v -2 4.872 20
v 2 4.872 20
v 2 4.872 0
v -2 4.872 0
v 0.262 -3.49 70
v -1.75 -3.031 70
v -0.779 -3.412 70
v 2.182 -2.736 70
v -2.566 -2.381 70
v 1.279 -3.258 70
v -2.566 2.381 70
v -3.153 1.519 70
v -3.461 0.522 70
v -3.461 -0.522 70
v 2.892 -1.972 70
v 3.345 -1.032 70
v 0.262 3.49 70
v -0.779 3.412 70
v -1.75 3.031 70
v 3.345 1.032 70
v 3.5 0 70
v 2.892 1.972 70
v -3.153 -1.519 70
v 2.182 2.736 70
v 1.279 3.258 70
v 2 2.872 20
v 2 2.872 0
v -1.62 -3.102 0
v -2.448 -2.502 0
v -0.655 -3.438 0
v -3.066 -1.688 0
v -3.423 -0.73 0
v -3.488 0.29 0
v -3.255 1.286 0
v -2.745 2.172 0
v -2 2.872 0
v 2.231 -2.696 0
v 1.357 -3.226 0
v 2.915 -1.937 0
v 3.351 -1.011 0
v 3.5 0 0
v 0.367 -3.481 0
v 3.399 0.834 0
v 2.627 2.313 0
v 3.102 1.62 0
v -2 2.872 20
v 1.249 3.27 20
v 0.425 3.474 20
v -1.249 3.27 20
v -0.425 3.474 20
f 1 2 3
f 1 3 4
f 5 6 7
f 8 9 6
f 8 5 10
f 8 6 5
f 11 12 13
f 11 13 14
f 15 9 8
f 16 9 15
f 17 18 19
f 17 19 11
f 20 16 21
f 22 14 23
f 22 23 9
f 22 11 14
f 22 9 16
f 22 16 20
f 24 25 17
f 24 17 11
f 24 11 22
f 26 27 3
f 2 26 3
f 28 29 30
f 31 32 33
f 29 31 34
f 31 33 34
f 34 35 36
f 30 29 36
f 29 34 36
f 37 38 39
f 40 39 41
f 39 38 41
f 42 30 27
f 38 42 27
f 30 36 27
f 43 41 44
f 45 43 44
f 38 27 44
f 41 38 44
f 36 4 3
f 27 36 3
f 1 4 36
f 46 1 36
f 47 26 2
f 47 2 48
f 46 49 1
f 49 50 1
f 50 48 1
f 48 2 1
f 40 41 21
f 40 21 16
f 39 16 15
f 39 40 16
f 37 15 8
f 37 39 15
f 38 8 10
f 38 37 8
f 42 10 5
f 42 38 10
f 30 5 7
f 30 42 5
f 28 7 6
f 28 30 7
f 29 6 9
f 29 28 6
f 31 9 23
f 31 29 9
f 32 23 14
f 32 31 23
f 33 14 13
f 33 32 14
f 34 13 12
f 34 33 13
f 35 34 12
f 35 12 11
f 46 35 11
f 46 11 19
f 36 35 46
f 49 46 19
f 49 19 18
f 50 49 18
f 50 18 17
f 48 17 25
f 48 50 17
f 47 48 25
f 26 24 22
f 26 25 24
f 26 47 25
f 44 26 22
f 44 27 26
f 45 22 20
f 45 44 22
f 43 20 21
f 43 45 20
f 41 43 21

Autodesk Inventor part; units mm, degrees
ref_plane "YZ Plane" through (0, 0, 0) normal (1, 0, 0) x (0, 1, 0)
ref_plane "XZ Plane" through (0, 0, 0) normal (0, 1, 0) x (-1, 0, 0)
ref_plane "XY Plane" through (0, 0, 0) normal (0, 0, 1) x (1, 0, 0)
sketch "Sketch1" plane through (0, 0, 0) normal (0, 0, 1) x (1, 0, 0)
  circle A0 centre (0, 0) radius 3.5
  dimension "d0" = 7
extrude "Extrusion1" add sketch "Sketch1" along normal blind 70
sketch "Sketch2" plane through (0, 0, 0) normal (0, 0, -1) x (-1, 0, 0)
  circle A0 centre (0, 0) radius 3.5 projected
  line L0 (-2, 2.8723) -> (-2, 4.8723)
  line L1 (-2, 4.8723) -> (2, 4.8723)
  line L2 (2, 4.8723) -> (2, 2.8723)
  arc A1 (2, 2.8723) -> (-2, 2.8723) centre (0, 0) ccw
  point P0 (0, 4.8723)
  dimension "d3" = 4
  dimension "d4" = 2
extrude "Extrusion2" add sketch "Sketch2" against normal blind 20 contours A0 L0 L1 L2
properties part number "shaft1"
